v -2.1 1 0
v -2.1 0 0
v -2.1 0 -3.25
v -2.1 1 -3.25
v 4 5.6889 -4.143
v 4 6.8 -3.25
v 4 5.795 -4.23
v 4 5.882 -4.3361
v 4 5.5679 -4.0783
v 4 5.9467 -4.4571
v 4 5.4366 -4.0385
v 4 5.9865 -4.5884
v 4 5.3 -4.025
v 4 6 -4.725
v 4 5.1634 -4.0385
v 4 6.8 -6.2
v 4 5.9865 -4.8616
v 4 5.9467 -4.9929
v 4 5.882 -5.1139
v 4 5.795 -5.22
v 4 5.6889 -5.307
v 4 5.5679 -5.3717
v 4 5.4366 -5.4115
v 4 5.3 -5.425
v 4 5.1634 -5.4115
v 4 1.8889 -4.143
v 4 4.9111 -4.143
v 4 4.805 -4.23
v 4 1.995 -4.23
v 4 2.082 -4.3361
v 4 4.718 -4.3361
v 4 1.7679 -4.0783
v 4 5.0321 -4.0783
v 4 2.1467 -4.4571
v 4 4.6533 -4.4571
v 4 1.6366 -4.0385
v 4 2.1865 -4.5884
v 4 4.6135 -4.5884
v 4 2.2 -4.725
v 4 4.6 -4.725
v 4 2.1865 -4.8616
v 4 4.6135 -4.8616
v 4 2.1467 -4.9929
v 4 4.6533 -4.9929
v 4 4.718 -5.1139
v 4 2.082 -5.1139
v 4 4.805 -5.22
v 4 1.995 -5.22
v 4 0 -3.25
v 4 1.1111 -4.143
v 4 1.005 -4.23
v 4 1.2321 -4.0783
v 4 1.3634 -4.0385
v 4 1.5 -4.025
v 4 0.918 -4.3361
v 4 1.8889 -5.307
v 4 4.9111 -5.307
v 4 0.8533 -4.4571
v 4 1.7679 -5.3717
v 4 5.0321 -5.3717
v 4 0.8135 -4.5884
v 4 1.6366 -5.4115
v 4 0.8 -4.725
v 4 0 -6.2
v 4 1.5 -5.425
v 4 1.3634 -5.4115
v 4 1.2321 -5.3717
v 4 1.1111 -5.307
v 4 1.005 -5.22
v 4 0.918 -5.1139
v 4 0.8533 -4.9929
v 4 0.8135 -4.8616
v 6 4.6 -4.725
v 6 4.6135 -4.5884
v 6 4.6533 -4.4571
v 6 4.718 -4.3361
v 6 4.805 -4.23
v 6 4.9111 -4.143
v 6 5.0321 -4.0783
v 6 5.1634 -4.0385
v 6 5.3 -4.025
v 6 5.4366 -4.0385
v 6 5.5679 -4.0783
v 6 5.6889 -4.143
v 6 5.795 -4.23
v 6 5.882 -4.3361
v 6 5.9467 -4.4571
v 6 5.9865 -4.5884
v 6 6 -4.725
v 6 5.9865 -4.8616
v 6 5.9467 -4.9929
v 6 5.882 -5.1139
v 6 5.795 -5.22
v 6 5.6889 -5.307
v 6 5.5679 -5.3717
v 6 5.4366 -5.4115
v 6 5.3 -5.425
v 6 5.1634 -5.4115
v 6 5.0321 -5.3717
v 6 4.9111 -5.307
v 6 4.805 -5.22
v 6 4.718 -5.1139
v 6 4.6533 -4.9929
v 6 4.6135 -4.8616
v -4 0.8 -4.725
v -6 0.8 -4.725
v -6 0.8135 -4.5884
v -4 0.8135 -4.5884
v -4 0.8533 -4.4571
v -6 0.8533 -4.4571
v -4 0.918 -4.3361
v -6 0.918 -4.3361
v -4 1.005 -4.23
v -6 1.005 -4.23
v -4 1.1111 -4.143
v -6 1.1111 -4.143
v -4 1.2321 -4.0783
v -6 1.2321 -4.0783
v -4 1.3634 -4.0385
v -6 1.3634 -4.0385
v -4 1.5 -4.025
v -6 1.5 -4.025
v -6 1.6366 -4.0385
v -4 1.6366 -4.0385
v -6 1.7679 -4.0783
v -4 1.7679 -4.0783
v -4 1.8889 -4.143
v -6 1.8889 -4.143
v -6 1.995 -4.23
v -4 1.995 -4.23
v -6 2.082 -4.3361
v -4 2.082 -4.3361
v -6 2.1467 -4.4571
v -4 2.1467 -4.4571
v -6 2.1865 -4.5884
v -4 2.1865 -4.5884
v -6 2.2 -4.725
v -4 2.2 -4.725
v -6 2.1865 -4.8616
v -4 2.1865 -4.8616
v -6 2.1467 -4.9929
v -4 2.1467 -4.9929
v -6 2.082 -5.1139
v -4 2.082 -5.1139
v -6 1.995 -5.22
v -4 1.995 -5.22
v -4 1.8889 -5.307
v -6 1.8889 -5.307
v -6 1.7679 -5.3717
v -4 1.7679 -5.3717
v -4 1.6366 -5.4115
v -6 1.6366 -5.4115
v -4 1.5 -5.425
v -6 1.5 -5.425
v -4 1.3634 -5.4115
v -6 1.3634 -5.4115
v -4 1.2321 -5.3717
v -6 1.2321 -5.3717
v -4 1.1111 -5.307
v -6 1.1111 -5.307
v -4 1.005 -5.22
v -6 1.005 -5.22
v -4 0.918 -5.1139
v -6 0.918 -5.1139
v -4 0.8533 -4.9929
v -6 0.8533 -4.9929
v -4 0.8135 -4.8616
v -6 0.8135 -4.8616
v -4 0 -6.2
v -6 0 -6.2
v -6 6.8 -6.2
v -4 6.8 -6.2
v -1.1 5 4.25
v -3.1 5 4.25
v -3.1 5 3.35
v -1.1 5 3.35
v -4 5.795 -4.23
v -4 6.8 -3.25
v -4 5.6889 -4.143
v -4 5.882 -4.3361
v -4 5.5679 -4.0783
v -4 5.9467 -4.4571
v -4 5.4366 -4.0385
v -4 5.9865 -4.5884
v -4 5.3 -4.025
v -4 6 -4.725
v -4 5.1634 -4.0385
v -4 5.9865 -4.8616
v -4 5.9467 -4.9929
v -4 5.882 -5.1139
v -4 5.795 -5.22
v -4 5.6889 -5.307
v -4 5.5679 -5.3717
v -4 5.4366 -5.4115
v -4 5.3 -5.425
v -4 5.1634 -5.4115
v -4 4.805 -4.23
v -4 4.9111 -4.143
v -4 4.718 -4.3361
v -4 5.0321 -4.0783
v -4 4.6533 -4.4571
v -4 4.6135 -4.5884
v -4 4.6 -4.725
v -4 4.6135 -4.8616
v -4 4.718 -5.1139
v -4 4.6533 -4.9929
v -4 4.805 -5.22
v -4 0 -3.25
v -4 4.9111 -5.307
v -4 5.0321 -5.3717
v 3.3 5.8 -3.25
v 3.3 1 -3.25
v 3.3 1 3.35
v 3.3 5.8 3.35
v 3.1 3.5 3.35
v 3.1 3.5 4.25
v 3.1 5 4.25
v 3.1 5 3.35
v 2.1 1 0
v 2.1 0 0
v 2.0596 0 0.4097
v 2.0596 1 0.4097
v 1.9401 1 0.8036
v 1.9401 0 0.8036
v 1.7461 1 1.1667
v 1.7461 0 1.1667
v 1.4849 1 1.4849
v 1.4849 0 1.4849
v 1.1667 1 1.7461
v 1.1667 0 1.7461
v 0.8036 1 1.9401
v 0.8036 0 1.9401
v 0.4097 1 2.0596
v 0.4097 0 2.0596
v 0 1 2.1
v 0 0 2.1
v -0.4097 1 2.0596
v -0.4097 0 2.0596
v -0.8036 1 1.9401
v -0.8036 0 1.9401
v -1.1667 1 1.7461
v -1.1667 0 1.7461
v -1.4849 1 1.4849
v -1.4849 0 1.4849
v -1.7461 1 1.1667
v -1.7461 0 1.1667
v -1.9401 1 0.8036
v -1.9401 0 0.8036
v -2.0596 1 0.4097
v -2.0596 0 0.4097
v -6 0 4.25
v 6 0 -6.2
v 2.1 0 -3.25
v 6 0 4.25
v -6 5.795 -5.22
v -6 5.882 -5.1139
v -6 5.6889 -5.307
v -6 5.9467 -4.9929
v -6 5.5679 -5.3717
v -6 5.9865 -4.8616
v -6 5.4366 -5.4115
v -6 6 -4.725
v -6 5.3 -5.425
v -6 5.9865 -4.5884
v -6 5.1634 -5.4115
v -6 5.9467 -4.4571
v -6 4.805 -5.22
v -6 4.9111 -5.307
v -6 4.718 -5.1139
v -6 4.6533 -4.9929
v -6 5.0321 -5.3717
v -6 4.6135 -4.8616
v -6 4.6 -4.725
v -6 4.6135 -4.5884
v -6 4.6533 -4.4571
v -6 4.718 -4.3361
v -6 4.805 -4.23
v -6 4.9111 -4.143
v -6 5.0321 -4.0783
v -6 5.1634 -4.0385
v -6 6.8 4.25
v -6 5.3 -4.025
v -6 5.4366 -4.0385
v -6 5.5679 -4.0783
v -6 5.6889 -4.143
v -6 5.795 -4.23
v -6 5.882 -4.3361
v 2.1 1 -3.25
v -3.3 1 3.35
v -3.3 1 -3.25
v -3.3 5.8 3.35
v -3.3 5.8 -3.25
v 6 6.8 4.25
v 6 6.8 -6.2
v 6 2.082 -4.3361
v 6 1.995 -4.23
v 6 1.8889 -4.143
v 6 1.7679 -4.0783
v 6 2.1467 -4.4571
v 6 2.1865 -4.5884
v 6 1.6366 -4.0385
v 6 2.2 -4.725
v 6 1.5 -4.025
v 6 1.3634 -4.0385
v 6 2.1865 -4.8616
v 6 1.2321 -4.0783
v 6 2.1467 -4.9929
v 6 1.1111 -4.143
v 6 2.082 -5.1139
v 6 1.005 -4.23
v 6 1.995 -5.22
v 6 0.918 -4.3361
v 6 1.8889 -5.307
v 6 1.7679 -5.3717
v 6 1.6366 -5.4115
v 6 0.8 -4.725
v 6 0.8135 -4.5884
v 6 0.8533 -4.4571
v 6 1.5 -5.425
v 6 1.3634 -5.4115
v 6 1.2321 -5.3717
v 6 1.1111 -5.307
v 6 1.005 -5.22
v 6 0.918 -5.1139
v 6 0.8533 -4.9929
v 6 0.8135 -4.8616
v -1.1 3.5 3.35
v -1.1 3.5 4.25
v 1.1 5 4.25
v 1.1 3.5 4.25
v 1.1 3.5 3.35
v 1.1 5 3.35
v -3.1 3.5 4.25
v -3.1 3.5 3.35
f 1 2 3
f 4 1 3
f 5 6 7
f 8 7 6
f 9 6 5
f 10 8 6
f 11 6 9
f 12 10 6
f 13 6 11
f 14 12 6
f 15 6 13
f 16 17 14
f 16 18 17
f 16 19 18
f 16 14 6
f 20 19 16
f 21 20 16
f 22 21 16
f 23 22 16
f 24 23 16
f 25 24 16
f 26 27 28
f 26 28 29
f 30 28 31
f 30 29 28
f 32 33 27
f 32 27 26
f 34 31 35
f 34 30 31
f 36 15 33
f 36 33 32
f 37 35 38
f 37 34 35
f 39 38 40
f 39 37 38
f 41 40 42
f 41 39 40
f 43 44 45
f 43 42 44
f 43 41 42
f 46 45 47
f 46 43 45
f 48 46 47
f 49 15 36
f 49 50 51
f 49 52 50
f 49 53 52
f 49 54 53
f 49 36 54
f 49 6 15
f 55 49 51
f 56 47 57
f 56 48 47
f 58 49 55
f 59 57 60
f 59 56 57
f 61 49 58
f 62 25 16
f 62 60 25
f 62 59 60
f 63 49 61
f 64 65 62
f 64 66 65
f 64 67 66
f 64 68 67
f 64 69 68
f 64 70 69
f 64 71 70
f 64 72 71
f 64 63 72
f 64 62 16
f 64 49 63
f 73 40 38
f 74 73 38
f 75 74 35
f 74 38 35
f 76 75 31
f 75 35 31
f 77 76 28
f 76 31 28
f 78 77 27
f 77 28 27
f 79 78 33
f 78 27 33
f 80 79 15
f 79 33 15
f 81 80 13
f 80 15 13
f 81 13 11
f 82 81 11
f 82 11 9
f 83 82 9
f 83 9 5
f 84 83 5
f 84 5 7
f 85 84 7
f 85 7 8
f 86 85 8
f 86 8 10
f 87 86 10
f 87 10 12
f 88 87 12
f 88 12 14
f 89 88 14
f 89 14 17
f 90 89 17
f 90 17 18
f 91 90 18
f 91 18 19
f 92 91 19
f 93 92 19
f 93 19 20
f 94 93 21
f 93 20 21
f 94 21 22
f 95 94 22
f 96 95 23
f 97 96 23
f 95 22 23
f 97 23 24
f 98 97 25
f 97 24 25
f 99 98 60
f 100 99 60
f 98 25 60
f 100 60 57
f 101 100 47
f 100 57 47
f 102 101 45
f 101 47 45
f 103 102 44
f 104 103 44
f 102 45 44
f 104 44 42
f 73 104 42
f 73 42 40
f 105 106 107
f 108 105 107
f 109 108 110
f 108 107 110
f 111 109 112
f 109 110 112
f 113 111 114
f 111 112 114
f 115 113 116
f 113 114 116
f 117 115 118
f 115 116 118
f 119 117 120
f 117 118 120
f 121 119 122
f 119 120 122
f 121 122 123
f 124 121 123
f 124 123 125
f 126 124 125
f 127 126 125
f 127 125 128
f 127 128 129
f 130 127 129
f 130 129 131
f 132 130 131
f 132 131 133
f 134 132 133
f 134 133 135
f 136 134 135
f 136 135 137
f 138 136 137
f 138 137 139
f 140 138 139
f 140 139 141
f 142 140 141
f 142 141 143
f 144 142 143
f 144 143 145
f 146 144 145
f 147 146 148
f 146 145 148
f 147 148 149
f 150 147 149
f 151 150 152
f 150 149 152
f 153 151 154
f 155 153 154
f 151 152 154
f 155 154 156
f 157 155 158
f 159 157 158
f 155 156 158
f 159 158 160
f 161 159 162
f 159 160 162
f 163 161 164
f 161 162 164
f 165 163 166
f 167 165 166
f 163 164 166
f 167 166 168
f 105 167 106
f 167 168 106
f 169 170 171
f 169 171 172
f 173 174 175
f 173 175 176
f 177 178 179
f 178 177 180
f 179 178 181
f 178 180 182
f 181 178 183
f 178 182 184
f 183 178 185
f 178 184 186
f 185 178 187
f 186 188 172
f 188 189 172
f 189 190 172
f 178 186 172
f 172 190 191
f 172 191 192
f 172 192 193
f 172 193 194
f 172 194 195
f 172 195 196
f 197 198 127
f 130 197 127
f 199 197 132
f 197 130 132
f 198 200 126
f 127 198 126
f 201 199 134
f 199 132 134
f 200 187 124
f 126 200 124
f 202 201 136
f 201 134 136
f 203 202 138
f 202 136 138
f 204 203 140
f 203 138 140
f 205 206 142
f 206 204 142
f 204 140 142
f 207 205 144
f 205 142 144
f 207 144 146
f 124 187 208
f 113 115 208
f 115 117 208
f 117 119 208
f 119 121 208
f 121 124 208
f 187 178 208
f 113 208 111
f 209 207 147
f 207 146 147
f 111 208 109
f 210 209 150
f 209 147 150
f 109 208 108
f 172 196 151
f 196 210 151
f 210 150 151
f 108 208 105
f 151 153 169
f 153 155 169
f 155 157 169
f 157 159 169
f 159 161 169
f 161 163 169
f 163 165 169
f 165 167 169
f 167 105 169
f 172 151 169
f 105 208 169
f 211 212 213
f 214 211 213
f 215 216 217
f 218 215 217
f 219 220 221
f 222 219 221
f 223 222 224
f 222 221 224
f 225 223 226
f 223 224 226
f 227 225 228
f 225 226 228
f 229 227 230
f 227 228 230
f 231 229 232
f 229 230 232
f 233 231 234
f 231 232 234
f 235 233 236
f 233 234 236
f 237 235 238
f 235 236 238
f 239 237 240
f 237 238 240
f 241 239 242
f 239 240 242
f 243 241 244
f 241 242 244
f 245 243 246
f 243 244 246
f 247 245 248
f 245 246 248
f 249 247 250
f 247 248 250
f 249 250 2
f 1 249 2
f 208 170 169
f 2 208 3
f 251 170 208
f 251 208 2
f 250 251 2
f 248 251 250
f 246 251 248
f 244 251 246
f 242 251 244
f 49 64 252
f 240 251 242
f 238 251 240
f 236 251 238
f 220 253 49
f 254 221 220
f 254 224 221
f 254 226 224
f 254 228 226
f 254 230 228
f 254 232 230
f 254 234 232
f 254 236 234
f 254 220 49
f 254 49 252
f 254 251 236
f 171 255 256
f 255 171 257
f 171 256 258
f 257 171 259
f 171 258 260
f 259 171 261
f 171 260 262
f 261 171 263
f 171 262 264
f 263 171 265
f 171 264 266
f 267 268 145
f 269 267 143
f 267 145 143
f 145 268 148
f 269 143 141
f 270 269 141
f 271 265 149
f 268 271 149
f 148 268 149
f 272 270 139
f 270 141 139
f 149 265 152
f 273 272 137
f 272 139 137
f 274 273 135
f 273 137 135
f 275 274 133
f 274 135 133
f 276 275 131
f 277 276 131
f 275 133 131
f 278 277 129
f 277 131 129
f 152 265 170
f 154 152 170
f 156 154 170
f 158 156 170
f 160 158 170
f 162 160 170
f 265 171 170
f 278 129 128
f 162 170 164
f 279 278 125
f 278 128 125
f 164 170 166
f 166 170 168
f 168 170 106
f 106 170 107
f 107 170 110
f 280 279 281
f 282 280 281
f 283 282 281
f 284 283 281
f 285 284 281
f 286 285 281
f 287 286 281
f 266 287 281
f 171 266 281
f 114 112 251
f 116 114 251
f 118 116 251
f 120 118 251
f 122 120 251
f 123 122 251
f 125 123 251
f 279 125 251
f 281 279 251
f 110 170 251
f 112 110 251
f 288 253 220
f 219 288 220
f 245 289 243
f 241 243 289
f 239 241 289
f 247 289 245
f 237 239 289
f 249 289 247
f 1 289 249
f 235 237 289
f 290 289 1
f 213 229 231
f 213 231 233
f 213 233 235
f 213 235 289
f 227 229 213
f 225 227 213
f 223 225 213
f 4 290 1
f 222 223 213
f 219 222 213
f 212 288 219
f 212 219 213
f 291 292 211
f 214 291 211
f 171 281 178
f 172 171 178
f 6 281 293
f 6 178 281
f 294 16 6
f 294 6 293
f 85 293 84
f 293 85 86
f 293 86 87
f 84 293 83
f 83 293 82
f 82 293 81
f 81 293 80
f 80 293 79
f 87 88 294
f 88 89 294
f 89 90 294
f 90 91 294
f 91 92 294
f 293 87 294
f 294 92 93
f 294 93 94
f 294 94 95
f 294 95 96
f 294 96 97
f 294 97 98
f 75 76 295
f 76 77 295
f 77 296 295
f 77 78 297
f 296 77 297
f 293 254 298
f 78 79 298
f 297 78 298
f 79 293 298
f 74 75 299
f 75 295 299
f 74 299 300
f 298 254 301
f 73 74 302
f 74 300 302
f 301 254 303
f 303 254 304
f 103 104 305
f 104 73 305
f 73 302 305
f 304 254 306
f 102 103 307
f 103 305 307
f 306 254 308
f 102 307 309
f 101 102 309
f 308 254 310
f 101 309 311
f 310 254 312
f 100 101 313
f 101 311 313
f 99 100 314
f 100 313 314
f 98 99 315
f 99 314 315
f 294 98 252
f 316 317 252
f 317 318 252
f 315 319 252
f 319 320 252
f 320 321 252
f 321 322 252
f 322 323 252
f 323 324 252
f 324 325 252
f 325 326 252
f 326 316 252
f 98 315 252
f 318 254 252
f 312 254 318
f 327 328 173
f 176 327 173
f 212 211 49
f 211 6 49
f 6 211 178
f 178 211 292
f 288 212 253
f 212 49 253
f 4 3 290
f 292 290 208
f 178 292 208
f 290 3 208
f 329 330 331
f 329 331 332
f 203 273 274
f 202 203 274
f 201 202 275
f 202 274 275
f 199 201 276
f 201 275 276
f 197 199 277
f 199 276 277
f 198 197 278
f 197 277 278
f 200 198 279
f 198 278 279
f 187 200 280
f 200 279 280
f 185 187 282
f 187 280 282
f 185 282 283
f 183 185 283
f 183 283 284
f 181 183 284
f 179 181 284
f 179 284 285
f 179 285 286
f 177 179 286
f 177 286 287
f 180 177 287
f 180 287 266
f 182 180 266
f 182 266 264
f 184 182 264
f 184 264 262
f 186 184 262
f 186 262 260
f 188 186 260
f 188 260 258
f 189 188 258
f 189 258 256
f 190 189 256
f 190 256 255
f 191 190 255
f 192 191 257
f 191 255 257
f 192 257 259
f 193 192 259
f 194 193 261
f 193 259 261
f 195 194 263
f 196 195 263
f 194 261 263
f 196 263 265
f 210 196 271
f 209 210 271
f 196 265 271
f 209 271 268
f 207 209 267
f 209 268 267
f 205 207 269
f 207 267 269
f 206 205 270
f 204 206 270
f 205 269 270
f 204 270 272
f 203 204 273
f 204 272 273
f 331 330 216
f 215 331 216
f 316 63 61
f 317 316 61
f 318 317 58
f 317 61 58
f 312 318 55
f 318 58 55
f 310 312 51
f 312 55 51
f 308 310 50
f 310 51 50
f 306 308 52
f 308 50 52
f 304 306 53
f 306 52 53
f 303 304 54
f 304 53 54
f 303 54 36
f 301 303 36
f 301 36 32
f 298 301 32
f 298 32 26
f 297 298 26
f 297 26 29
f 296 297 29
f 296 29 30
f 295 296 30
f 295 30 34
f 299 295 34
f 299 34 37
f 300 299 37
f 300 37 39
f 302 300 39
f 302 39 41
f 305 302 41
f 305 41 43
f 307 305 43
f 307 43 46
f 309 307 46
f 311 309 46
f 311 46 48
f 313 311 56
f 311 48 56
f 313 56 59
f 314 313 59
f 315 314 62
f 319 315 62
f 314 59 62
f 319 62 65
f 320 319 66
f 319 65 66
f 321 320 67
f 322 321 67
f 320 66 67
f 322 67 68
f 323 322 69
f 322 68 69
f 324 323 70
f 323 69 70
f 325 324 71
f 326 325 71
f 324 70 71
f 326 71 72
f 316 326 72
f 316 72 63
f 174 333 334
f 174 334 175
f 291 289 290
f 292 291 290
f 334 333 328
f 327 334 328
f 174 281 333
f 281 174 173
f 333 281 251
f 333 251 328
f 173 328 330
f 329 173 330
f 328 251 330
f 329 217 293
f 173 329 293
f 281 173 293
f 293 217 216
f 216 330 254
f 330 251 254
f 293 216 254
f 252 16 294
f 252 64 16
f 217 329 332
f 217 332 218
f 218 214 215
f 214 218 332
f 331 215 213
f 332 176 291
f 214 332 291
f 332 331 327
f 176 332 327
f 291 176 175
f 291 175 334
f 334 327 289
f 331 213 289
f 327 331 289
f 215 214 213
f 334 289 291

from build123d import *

# Parameters (mm, degrees)
EXTRUDE_1_DEPTH     = 1
EXTRUDE_2_DEPTH     = 4.8
SKETCH_4_W          = 2
SKETCH_4_H          = 5.8
EXTRUDE_3_DEPTH     = 10.45
SKETCH_5_W          = 2
SKETCH_5_H          = 2.95
EXTRUDE_4_DEPTH     = 1
SKETCH_6_W          = 2
SKETCH_6_H          = 1.5
CUT_EXTRUDE_1_DEPTH = 14.836274788
SKETCH_7_R          = 0.7
CUT_EXTRUDE_2_DEPTH = 16.122169157


with BuildPart() as part:
    # 草图1 → 凸台-拉伸1 (new body)
    with BuildSketch(Plane(origin=(0, 0, 0), x_dir=(1, 0, 0), z_dir=(0, 1, 0))):
        with BuildLine():
            Line((-4, 3.25), (-4, -4.25))
            Line((-4, -4.25), (4, -4.25))
            Line((4, -4.25), (4, 3.25))
            Line((4, 3.25), (2.1, 3.25))
            Line((2.1, 3.25), (2.1, 0))
            ThreePointArc((2.1, 0), (0, -2.1), (-2.1, 0))
            Line((-2.1, 0), (-2.1, 3.25))
            Line((-2.1, 3.25), (-4, 3.25))
        make_face()
    extrude(amount=EXTRUDE_1_DEPTH)

    # 草图3 → 凸台-拉伸2 (add)
    with BuildSketch(Plane(origin=(0, 1, 0), x_dir=(1, 0, 0), z_dir=(0, 1, 0))):
        Polygon((-3.3, 3.25), (-4, 3.25), (-4, -4.25), (4, -4.25), (4, 3.25), (3.3, 3.25), (3.3, -3.35), (-3.3, -3.35), align=None)
    extrude(amount=EXTRUDE_2_DEPTH)

    # 草图4 → 凸台-拉伸3 (add)
    with BuildSketch(Plane.XY.offset(4.25)):
        with Locations((5, 2.9)):
            Rectangle(SKETCH_4_W, SKETCH_4_H)
        with Locations((-5, 2.9)):
            Rectangle(SKETCH_4_W, SKETCH_4_H)
    extrude(amount=-EXTRUDE_3_DEPTH)

    # 草图5 → 凸台-拉伸4 (add)
    with BuildSketch(Plane(origin=(0, 5.8, 0), x_dir=(1, 0, 0), z_dir=(0, 1, 0))):
        Polygon((-6, 3.25), (-6, -4.25), (6, -4.25), (6, 3.25), (4, 3.25), (-4, 3.25), align=None)
        with Locations((-5, 4.725)):
            Rectangle(SKETCH_5_W, SKETCH_5_H)
        with Locations((5, 4.725)):
            Rectangle(SKETCH_5_W, SKETCH_5_H)
    extrude(amount=EXTRUDE_4_DEPTH)

    # 草图6 → 切除-拉伸1 (cut, through all)
    with BuildSketch(Plane.XY.offset(4.25)):
        with Locations((-2.1, 4.25)):
            Rectangle(SKETCH_6_W, SKETCH_6_H)
        with Locations((2.1, 4.25)):
            Rectangle(SKETCH_6_W, SKETCH_6_H)
    extrude(amount=-CUT_EXTRUDE_1_DEPTH, mode=Mode.SUBTRACT)

    # 草图7 → 切除-拉伸2 (cut, through all)
    with BuildSketch(Plane.ZY.offset(6)):
        with Locations(Location((-4.725, 5.3, 0), (0, 0, 270))):
            Circle(SKETCH_7_R)
        with Locations(Location((-4.725, 1.5, 0), (0, 0, 270))):
            Circle(SKETCH_7_R)
    extrude(amount=-CUT_EXTRUDE_2_DEPTH, mode=Mode.SUBTRACT)


solid = part.part
